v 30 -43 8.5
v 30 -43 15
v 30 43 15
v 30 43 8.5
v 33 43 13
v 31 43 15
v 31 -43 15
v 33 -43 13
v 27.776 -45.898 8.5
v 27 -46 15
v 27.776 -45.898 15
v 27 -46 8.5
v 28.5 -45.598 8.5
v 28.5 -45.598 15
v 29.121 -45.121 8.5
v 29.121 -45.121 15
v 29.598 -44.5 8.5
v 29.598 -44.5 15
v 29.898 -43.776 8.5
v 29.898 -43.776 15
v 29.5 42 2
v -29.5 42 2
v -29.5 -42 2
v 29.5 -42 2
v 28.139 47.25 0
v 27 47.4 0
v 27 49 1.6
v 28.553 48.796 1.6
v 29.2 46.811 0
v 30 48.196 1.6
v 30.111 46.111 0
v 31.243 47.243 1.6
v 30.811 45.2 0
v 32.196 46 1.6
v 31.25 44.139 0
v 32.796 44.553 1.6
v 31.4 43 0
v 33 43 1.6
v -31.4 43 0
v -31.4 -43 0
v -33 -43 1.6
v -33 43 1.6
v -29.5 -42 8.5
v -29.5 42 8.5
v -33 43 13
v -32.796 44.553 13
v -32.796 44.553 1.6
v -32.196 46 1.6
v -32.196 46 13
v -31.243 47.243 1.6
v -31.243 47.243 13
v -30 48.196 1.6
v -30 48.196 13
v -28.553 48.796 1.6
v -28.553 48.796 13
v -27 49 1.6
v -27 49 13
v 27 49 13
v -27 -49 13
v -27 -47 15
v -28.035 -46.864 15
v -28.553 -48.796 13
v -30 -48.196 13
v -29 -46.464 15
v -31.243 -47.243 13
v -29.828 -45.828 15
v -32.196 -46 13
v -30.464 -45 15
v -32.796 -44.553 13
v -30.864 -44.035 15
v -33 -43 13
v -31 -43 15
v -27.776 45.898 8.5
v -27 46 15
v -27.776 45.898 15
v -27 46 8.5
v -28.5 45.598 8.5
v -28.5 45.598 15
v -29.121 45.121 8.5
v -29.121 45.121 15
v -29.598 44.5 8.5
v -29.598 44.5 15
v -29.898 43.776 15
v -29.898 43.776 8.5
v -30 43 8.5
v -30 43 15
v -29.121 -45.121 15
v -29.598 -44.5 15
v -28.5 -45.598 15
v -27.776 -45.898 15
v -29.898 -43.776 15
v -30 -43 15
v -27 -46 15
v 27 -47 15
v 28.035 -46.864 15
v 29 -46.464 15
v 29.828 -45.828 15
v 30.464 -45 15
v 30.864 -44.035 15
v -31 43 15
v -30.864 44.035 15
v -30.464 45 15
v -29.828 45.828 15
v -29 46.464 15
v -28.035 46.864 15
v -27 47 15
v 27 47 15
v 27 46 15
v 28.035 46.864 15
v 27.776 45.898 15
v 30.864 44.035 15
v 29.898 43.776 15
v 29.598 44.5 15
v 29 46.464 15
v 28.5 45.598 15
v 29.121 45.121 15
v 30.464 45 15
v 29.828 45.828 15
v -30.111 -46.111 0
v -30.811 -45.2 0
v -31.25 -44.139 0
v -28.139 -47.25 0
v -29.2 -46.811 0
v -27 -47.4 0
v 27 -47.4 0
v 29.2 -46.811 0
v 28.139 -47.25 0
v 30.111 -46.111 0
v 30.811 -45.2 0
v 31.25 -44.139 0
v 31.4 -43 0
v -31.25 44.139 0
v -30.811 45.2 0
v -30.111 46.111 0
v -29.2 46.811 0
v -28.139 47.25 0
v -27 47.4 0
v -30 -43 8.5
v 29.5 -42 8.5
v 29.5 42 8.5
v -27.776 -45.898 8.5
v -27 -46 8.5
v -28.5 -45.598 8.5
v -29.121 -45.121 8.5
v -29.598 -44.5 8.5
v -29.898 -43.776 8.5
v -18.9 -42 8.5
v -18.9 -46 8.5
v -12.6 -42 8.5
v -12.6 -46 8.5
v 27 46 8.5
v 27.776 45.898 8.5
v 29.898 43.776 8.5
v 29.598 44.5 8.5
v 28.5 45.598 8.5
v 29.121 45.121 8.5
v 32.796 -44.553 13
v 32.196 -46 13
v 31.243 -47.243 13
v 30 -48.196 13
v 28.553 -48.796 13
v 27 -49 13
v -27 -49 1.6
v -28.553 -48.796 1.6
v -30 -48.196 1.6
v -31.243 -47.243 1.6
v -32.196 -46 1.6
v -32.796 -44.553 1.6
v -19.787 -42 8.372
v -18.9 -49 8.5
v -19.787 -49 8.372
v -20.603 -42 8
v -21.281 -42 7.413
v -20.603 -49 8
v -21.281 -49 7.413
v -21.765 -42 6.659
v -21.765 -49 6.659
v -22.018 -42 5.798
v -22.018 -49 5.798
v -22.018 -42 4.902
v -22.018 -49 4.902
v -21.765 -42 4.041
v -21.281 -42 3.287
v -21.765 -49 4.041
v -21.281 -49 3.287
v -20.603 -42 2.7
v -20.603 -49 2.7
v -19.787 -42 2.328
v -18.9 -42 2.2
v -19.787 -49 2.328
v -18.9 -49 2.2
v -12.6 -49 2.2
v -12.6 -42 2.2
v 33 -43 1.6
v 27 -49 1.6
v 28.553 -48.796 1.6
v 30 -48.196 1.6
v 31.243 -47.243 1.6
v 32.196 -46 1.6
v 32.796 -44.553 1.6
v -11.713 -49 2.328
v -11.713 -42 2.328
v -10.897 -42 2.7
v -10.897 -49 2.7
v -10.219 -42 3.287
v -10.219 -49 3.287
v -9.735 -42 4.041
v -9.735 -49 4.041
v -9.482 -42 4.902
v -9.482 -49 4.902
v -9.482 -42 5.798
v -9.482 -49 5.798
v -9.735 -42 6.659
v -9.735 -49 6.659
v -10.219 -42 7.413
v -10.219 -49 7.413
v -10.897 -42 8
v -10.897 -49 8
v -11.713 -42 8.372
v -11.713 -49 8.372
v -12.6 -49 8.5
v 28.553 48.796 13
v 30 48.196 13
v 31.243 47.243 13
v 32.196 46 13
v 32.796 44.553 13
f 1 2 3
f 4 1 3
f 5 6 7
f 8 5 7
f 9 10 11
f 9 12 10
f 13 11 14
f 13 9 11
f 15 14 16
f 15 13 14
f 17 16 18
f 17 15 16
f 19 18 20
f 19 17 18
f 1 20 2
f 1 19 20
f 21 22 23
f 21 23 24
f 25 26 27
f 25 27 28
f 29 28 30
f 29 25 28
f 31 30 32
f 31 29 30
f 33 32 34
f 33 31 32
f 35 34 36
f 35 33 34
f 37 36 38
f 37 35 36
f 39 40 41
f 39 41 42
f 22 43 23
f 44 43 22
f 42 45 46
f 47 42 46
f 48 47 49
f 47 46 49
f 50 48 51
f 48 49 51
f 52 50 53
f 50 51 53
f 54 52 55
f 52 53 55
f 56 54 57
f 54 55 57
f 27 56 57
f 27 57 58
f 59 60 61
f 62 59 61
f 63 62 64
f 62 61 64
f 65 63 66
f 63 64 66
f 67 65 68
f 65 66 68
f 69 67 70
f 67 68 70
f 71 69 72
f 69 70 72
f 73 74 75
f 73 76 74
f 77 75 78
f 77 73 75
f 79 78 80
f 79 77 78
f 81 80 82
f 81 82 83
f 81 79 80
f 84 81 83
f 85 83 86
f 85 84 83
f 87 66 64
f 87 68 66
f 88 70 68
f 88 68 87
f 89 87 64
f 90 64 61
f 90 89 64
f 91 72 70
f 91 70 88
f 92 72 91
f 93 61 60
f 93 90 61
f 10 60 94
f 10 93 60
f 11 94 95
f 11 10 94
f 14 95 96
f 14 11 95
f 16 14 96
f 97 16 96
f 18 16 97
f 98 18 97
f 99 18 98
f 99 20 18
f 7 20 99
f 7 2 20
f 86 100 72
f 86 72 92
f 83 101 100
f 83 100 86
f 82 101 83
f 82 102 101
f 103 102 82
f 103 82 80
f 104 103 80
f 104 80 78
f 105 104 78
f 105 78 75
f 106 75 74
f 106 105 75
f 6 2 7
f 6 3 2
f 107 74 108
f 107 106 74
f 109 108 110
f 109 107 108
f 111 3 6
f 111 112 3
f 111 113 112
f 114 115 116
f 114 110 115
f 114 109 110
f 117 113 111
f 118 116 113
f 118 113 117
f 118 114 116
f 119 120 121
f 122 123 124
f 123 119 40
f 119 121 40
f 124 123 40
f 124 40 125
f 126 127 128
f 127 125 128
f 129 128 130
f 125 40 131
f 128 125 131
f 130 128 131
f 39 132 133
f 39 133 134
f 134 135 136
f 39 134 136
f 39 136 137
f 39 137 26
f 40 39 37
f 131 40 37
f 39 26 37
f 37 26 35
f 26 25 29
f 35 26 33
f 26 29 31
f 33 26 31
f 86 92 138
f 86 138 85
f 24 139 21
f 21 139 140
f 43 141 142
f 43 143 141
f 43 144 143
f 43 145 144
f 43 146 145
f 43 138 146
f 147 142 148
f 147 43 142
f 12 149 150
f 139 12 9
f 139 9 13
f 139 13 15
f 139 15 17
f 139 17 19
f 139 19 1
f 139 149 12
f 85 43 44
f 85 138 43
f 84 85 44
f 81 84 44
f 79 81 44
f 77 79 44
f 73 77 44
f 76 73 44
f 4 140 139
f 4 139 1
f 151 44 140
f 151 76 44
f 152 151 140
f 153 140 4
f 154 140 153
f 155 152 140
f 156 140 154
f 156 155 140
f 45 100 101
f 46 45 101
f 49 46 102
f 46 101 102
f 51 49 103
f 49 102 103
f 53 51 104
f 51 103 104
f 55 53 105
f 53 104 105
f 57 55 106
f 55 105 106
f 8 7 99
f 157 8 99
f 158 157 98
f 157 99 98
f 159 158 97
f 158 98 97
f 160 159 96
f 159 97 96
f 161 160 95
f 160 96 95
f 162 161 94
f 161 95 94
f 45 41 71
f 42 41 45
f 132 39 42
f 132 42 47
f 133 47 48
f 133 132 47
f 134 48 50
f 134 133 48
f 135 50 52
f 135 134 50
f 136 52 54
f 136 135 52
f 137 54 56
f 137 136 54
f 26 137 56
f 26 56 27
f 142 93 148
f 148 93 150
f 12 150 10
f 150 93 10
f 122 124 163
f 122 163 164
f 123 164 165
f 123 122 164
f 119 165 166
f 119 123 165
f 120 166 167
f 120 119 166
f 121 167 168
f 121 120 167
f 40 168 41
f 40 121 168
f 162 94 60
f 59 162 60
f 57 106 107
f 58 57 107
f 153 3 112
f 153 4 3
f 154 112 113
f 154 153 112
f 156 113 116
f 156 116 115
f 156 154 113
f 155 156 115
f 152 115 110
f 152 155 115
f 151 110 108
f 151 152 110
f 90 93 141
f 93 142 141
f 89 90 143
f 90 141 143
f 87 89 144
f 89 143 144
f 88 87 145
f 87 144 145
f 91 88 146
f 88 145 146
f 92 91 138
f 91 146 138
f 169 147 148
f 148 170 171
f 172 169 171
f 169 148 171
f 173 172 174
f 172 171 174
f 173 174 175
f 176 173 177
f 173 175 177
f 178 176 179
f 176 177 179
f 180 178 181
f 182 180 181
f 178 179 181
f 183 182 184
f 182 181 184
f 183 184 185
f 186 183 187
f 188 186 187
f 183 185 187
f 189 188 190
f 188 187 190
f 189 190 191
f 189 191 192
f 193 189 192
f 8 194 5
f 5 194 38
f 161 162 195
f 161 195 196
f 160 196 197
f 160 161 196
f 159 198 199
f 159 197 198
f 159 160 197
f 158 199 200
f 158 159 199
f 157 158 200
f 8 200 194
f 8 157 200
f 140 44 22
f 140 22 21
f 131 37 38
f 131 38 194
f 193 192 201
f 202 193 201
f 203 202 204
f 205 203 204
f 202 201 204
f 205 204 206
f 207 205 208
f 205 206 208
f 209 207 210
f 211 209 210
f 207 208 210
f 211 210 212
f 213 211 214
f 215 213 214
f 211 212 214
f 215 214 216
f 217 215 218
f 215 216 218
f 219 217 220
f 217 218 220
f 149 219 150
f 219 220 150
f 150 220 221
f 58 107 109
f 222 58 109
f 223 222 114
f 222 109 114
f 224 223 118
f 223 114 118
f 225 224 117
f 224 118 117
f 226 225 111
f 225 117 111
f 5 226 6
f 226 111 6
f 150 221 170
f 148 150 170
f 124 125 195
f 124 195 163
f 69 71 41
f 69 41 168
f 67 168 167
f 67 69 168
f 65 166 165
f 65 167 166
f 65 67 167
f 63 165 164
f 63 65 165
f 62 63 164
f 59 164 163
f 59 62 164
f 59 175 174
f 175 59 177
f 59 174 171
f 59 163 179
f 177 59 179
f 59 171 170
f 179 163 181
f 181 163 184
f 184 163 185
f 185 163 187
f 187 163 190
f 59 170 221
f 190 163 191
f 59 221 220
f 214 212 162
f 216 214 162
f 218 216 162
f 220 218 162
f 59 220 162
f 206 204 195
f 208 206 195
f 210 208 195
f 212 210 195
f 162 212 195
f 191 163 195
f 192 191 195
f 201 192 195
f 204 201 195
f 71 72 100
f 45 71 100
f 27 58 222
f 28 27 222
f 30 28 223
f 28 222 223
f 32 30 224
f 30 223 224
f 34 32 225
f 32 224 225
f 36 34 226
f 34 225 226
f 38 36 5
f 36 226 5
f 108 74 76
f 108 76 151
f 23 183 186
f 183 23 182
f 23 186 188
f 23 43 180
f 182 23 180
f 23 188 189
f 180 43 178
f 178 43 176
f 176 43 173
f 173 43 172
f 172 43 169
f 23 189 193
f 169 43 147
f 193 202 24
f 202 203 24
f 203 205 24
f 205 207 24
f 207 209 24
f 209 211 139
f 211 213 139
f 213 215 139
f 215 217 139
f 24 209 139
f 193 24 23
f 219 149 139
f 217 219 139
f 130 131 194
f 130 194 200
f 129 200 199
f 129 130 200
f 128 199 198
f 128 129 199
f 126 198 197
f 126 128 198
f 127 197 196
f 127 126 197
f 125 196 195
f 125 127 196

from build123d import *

# Parameters (mm, degrees)
SKETCH012_W     = 66
SKETCH012_H     = 98
PAD006_DEPTH    = 15
SKETCH013_W     = 60
SKETCH013_H     = 92
POCKET008_DEPTH = 6.5
FILLET008_R     = 3
SKETCH014_W     = 59
SKETCH014_H     = 84
POCKET009_DEPTH = 6.5
POCKET010_DEPTH = 7
FILLET009_R     = 6
CHAMFER005_SIZE = 1.6
CHAMFER006_SIZE = 2


with BuildPart() as part:
    # Sketch012 → Pad006 (new body)
    with BuildSketch(Plane.XY):
        Rectangle(SKETCH012_W, SKETCH012_H)
    extrude(amount=PAD006_DEPTH)

    # Sketch013 (on Face6 of Pad006) → Pocket008 (cut)
    with BuildSketch(Plane.XY.offset(15)):
        Rectangle(SKETCH013_W, SKETCH013_H)
    extrude(amount=-POCKET008_DEPTH, mode=Mode.SUBTRACT)

    # Fillet008
    fillet008_edges = [part.edges().sort_by_distance(p)[0] for p in [
        (30, 46, 11.75),
        (-30, 46, 11.75),
        (-30, -46, 11.75),
        (30, -46, 11.75),
    ]]
    fillet(fillet008_edges, radius=FILLET008_R)

    # Sketch014 (on Face11 of Pocket008) → Pocket009 (cut)
    with BuildSketch(Plane.XY.offset(8.5)):
        Rectangle(SKETCH014_W, SKETCH014_H)
    extrude(amount=-POCKET009_DEPTH, mode=Mode.SUBTRACT)

    # Sketch015 (on Face13 of Pocket009) → Pocket010 (cut)
    with BuildSketch(Plane.XZ.offset(49)):
        with BuildLine():
            ThreePointArc((-18.9, 8.5), (-22.05, 5.35), (-18.9, 2.2))
            Line((-18.9, 2.2), (-12.6, 2.2))
            ThreePointArc((-12.6, 2.2), (-9.45, 5.35), (-12.6, 8.5))
            Line((-12.6, 8.5), (-18.9, 8.5))
        make_face()
    extrude(amount=-POCKET010_DEPTH, mode=Mode.SUBTRACT)

    # Fillet009
    fillet009_edges = [part.edges().sort_by_distance(p)[0] for p in [
        (33, -49, 7.5),
        (33, 49, 7.5),
        (-33, -49, 7.5),
        (-33, 49, 7.5),
    ]]
    fillet(fillet009_edges, radius=FILLET009_R)

    # Chamfer005
    chamfer005_edges = [part.edges().sort_by_distance(p)[0] for p in [
        (0, 49, 0),
        (-31.242641, 47.242641, 0),
        (31.242641, 47.242641, 0),
        (-33, 0, 0),
        (33, 0, 0),
        (-31.242641, -47.242641, 0),
        (31.242641, -47.242641, 0),
        (0, -49, 0),
    ]]
    chamfer(chamfer005_edges, length=CHAMFER005_SIZE)

    # Chamfer006
    chamfer006_edges = [part.edges().sort_by_distance(p)[0] for p in [
        (-33, 0, 15),
    ]]
    chamfer(chamfer006_edges, length=CHAMFER006_SIZE)


solid = part.part
